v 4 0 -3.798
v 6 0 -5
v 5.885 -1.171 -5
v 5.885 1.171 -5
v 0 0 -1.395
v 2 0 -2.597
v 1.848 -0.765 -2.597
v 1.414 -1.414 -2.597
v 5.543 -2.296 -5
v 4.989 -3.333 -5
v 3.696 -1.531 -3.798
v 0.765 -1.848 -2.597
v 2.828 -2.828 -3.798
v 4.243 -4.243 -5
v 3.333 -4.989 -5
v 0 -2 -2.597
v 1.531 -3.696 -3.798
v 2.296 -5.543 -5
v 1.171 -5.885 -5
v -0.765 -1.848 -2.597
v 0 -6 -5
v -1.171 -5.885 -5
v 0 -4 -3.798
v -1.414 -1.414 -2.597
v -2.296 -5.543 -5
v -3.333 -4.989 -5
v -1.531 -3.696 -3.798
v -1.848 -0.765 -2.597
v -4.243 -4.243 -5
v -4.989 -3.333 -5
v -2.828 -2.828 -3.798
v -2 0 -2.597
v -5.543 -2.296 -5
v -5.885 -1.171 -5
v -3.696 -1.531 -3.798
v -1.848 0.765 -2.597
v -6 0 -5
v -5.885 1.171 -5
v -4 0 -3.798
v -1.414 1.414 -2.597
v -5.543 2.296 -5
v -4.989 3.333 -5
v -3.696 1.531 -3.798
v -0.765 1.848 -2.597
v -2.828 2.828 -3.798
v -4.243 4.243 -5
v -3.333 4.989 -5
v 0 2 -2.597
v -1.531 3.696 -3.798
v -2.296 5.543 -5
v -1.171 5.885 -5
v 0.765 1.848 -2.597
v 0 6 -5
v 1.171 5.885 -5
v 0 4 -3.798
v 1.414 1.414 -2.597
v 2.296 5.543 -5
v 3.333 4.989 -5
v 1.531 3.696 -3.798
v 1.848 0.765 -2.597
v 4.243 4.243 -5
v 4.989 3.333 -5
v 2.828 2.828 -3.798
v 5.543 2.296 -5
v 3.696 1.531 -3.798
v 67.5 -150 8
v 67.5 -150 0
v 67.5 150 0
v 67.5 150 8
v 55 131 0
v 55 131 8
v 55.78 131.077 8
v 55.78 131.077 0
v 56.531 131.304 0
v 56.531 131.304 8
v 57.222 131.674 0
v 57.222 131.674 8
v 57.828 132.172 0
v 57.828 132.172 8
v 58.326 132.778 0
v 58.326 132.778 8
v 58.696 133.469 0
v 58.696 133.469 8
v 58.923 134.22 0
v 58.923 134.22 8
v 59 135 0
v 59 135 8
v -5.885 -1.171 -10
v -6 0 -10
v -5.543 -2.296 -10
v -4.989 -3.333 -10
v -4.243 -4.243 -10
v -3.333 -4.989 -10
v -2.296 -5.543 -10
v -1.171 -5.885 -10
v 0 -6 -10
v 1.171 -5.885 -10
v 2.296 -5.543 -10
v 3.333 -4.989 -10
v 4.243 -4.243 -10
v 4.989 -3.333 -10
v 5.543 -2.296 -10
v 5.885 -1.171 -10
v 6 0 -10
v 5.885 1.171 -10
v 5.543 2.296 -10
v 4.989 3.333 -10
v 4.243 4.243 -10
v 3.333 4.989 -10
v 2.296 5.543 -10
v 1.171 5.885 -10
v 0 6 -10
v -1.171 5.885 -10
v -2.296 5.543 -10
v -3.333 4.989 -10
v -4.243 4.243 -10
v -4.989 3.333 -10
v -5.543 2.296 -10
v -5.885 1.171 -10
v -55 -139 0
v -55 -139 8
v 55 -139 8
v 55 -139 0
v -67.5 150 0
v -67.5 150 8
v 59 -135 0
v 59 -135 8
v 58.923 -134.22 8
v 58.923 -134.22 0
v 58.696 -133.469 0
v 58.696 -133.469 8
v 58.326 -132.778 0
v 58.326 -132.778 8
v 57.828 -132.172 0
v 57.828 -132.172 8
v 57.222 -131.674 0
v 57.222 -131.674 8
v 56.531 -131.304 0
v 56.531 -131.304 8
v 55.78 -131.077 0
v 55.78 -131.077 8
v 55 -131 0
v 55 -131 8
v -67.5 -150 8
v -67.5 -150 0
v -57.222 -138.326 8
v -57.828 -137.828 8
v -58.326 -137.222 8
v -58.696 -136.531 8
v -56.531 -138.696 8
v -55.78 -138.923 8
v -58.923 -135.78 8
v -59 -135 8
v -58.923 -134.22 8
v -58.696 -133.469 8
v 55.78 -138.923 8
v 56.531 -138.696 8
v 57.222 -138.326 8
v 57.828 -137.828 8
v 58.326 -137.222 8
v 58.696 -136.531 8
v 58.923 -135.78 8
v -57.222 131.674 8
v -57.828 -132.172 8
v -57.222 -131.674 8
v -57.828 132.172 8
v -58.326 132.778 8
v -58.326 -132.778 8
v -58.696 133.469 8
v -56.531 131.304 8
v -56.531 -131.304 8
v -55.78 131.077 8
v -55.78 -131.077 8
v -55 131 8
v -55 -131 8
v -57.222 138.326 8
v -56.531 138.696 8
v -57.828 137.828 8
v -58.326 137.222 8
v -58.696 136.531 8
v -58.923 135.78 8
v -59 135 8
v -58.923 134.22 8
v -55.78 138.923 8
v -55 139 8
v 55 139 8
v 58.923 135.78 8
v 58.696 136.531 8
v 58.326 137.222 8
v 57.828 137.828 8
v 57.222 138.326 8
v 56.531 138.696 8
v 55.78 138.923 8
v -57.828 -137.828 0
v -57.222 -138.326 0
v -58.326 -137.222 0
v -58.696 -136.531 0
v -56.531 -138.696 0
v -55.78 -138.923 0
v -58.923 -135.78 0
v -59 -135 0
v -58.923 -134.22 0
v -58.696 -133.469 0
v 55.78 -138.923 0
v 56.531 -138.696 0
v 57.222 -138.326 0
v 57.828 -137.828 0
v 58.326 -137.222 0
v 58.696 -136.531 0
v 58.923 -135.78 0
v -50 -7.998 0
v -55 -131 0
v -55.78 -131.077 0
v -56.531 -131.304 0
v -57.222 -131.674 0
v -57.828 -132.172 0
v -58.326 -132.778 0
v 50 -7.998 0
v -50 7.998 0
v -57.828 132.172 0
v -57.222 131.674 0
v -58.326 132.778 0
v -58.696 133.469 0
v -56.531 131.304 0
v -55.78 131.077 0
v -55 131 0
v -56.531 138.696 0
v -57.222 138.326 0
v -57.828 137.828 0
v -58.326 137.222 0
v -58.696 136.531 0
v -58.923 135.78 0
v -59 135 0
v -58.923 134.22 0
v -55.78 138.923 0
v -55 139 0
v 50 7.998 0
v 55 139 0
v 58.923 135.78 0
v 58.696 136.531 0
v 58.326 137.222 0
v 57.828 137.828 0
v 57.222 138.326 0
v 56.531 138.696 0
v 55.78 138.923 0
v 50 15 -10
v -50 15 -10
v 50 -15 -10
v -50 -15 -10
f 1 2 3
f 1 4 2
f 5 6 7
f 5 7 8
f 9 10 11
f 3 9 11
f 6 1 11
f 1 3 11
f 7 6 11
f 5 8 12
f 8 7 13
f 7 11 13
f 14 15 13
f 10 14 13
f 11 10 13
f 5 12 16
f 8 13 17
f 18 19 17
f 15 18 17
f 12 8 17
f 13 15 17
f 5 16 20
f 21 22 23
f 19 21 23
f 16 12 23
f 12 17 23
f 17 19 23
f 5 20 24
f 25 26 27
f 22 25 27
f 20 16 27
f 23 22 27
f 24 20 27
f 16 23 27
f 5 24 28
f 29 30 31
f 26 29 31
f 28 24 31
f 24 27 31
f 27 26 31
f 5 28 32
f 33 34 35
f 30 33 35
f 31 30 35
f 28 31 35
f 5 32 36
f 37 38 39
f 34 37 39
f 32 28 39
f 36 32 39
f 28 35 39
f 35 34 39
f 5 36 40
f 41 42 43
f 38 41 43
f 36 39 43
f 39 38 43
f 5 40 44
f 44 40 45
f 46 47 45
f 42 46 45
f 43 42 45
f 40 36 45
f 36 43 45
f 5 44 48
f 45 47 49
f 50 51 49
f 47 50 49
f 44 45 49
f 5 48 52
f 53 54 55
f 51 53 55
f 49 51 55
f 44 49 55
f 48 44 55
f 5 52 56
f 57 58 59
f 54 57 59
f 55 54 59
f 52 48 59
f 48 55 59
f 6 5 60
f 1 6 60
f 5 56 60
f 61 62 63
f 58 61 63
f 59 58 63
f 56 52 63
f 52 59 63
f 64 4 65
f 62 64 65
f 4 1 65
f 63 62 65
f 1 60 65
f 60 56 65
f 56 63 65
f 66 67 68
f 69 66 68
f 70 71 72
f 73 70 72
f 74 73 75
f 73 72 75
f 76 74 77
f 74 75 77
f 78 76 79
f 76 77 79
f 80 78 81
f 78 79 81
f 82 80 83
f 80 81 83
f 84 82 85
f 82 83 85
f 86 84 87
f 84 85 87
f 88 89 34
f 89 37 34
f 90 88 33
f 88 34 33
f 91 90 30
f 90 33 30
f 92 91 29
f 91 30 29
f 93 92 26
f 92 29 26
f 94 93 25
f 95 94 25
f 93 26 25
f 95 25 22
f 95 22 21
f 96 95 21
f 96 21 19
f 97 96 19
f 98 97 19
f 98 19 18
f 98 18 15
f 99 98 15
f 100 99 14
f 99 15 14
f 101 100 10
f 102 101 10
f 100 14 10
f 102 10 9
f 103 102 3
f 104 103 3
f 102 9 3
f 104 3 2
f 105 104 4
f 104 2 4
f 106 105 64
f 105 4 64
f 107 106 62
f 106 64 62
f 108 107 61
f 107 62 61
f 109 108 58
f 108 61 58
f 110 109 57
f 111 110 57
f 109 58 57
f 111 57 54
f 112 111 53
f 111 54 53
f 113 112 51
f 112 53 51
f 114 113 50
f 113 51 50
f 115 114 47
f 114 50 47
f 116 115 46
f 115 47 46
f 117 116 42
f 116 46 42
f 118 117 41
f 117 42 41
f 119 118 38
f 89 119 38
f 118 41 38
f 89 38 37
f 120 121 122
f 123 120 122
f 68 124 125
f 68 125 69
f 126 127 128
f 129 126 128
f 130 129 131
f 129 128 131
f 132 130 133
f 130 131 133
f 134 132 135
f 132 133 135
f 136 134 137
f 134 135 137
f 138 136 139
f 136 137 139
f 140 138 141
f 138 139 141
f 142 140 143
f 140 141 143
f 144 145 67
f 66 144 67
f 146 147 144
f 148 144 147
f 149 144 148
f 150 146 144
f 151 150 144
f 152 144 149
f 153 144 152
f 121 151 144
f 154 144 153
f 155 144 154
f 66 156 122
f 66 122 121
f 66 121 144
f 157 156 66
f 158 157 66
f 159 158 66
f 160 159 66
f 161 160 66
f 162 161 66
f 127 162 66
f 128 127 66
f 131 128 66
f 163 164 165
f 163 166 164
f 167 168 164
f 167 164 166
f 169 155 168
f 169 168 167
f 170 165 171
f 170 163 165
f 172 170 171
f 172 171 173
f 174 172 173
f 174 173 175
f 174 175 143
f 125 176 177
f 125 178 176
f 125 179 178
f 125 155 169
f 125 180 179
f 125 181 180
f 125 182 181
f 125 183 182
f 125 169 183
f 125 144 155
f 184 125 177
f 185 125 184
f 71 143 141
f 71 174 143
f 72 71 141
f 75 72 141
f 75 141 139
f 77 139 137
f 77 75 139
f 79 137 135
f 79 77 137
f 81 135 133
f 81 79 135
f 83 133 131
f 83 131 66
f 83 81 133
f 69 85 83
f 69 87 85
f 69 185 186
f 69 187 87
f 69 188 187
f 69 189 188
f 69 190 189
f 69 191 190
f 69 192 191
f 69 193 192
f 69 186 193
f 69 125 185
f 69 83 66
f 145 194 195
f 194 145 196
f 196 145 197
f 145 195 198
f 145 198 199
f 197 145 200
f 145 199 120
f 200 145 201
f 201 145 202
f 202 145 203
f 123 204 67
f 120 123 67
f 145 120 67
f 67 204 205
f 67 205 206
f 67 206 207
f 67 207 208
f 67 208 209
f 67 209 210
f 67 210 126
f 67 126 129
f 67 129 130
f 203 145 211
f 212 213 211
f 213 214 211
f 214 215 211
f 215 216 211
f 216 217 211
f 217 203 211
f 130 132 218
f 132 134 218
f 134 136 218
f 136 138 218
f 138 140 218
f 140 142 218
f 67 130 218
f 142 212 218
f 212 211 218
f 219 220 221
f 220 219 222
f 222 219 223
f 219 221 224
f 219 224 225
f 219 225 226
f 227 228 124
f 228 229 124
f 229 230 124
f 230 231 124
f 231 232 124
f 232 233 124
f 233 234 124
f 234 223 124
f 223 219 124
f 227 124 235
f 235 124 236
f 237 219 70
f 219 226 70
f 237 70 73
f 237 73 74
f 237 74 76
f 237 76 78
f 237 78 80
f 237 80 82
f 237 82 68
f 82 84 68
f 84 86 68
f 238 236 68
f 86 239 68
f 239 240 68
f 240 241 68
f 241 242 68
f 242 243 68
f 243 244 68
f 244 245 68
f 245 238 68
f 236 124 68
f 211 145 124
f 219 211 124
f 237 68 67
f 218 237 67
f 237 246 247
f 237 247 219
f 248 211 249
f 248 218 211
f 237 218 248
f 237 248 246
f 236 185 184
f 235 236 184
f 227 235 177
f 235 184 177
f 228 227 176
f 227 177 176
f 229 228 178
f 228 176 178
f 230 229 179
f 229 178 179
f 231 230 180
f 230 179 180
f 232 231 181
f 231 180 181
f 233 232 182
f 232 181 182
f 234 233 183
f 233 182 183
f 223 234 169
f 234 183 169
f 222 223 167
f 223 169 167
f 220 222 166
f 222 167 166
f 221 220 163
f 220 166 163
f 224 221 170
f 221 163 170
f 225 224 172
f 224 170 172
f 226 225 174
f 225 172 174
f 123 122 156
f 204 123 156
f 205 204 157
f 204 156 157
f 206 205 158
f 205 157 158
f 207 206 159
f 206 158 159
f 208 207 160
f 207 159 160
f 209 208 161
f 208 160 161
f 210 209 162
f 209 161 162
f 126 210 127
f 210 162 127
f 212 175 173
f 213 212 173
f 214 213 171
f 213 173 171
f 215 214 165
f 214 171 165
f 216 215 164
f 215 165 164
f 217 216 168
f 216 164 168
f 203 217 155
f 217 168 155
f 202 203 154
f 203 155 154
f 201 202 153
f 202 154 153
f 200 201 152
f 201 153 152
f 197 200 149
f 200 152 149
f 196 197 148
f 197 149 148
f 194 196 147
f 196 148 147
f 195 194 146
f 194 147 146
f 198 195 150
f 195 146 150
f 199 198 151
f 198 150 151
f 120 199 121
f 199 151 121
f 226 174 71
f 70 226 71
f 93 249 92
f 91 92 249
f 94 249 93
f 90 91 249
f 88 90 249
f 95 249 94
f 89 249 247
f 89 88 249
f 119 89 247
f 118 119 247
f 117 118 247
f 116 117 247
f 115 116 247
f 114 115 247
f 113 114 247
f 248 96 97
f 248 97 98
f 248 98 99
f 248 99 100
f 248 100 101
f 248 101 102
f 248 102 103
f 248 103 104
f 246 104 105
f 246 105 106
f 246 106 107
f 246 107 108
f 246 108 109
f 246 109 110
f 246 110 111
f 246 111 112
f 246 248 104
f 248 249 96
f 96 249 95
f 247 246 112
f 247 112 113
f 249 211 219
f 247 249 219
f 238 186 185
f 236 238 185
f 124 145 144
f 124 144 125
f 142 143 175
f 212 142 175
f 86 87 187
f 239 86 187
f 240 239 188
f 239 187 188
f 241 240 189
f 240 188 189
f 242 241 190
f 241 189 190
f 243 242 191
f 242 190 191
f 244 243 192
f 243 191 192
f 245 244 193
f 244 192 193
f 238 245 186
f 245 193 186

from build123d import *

# Parameters (mm, degrees)
F0_W     = 135
F0_H     = 300
F1_DEPTH = 8
F3_DEPTH = 50
F5_D     = 12
F5_DEPTH = 5
F5_TIP   = 3.6051637142
F7_DEPTH = 25


with BuildPart() as f1:
    # F0 (on Top) → F1 (new body)
    with BuildSketch(Plane.XY):
        Rectangle(F0_W, F0_H)
    extrude(amount=F1_DEPTH)

    # F2 (on Right) → F3 (join, symmetric)
    with BuildSketch(Plane.YZ):
        Polygon((0, -10), (0, 0), (-7.9979246179, 0), (-15, -10), align=None)
        Polygon((7.9979246179, 0), (0, 0), (0, -10), (15, -10), align=None)
    extrude(amount=F3_DEPTH, both=True)

    # F5
    with Locations(Plane(origin=(0, 0, -10), x_dir=(1, 0, 0), z_dir=(0, 0, -1))):
        with Locations((0, 0)):
            Hole(F5_D / 2, depth=F5_DEPTH)
            with Locations((0, 0, -(F5_DEPTH + F5_TIP / 2))):  # 118° drill point
                Cone(0, F5_D / 2, F5_TIP, mode=Mode.SUBTRACT)

    # F6 (on face) → F7 (cut)
    with BuildSketch(Plane.XY.offset(8)):
        with BuildLine():
            ThreePointArc((59, -135), (57.8284271247, -132.1715728753), (55, -131))
            Line((55, -131), (55, -139))
            ThreePointArc((55, -139), (57.8284271247, -137.8284271247), (59, -135))
        make_face()
        with BuildLine():
            Line((55, -139), (55, -131))
            ThreePointArc((55, -131), (51, -135), (55, -139))
        make_face()
        with BuildLine():
            Line((55, -131), (-55, -131))
            ThreePointArc((-55, -131), (-52.1715728753, -132.1715728753), (-51, -135))
            ThreePointArc((-51, -135), (-52.1715728753, -137.8284271247), (-55, -139))
            Line((-55, -139), (55, -139))
            ThreePointArc((55, -139), (51, -135), (55, -131))
        make_face()
        with BuildLine():
            ThreePointArc((-51, -135), (-52.1715728753, -132.1715728753), (-55, -131))
            Line((-55, -131), (-55, -139))
            ThreePointArc((-55, -139), (-52.1715728753, -137.8284271247), (-51, -135))
        make_face()
        with BuildLine():
            Line((-55, -139), (-55, -131))
            ThreePointArc((-55, -131), (-59, -135), (-55, -139))
        make_face()
        with BuildLine():
            Line((55, 139), (55, 131))
            ThreePointArc((55, 131), (57.8284271247, 132.1715728753), (59, 135))
            ThreePointArc((59, 135), (57.8284271247, 137.8284271247), (55, 139))
        make_face()
        with BuildLine():
            ThreePointArc((55, 139), (51, 135), (55, 131))
            Line((55, 131), (55, 139))
        make_face()
        with BuildLine():
            ThreePointArc((-51, 135), (-52.1715728753, 132.1715728753), (-55, 131))
            Line((-55, 131), (55, 131))
            ThreePointArc((55, 131), (51, 135), (55, 139))
            Line((55, 139), (-55, 139))
            ThreePointArc((-55, 139), (-52.1715728753, 137.8284271247), (-51, 135))
        make_face()
        with BuildLine():
            ThreePointArc((-55, 139), (-59, 135), (-55, 131))
            Line((-55, 131), (-55, 139))
        make_face()
        with BuildLine():
            Line((-55, 139), (-55, 131))
            ThreePointArc((-55, 131), (-52.1715728753, 132.1715728753), (-51, 135))
            ThreePointArc((-51, 135), (-52.1715728753, 137.8284271247), (-55, 139))
        make_face()
    extrude(amount=-F7_DEPTH, mode=Mode.SUBTRACT)


solid = f1.part
